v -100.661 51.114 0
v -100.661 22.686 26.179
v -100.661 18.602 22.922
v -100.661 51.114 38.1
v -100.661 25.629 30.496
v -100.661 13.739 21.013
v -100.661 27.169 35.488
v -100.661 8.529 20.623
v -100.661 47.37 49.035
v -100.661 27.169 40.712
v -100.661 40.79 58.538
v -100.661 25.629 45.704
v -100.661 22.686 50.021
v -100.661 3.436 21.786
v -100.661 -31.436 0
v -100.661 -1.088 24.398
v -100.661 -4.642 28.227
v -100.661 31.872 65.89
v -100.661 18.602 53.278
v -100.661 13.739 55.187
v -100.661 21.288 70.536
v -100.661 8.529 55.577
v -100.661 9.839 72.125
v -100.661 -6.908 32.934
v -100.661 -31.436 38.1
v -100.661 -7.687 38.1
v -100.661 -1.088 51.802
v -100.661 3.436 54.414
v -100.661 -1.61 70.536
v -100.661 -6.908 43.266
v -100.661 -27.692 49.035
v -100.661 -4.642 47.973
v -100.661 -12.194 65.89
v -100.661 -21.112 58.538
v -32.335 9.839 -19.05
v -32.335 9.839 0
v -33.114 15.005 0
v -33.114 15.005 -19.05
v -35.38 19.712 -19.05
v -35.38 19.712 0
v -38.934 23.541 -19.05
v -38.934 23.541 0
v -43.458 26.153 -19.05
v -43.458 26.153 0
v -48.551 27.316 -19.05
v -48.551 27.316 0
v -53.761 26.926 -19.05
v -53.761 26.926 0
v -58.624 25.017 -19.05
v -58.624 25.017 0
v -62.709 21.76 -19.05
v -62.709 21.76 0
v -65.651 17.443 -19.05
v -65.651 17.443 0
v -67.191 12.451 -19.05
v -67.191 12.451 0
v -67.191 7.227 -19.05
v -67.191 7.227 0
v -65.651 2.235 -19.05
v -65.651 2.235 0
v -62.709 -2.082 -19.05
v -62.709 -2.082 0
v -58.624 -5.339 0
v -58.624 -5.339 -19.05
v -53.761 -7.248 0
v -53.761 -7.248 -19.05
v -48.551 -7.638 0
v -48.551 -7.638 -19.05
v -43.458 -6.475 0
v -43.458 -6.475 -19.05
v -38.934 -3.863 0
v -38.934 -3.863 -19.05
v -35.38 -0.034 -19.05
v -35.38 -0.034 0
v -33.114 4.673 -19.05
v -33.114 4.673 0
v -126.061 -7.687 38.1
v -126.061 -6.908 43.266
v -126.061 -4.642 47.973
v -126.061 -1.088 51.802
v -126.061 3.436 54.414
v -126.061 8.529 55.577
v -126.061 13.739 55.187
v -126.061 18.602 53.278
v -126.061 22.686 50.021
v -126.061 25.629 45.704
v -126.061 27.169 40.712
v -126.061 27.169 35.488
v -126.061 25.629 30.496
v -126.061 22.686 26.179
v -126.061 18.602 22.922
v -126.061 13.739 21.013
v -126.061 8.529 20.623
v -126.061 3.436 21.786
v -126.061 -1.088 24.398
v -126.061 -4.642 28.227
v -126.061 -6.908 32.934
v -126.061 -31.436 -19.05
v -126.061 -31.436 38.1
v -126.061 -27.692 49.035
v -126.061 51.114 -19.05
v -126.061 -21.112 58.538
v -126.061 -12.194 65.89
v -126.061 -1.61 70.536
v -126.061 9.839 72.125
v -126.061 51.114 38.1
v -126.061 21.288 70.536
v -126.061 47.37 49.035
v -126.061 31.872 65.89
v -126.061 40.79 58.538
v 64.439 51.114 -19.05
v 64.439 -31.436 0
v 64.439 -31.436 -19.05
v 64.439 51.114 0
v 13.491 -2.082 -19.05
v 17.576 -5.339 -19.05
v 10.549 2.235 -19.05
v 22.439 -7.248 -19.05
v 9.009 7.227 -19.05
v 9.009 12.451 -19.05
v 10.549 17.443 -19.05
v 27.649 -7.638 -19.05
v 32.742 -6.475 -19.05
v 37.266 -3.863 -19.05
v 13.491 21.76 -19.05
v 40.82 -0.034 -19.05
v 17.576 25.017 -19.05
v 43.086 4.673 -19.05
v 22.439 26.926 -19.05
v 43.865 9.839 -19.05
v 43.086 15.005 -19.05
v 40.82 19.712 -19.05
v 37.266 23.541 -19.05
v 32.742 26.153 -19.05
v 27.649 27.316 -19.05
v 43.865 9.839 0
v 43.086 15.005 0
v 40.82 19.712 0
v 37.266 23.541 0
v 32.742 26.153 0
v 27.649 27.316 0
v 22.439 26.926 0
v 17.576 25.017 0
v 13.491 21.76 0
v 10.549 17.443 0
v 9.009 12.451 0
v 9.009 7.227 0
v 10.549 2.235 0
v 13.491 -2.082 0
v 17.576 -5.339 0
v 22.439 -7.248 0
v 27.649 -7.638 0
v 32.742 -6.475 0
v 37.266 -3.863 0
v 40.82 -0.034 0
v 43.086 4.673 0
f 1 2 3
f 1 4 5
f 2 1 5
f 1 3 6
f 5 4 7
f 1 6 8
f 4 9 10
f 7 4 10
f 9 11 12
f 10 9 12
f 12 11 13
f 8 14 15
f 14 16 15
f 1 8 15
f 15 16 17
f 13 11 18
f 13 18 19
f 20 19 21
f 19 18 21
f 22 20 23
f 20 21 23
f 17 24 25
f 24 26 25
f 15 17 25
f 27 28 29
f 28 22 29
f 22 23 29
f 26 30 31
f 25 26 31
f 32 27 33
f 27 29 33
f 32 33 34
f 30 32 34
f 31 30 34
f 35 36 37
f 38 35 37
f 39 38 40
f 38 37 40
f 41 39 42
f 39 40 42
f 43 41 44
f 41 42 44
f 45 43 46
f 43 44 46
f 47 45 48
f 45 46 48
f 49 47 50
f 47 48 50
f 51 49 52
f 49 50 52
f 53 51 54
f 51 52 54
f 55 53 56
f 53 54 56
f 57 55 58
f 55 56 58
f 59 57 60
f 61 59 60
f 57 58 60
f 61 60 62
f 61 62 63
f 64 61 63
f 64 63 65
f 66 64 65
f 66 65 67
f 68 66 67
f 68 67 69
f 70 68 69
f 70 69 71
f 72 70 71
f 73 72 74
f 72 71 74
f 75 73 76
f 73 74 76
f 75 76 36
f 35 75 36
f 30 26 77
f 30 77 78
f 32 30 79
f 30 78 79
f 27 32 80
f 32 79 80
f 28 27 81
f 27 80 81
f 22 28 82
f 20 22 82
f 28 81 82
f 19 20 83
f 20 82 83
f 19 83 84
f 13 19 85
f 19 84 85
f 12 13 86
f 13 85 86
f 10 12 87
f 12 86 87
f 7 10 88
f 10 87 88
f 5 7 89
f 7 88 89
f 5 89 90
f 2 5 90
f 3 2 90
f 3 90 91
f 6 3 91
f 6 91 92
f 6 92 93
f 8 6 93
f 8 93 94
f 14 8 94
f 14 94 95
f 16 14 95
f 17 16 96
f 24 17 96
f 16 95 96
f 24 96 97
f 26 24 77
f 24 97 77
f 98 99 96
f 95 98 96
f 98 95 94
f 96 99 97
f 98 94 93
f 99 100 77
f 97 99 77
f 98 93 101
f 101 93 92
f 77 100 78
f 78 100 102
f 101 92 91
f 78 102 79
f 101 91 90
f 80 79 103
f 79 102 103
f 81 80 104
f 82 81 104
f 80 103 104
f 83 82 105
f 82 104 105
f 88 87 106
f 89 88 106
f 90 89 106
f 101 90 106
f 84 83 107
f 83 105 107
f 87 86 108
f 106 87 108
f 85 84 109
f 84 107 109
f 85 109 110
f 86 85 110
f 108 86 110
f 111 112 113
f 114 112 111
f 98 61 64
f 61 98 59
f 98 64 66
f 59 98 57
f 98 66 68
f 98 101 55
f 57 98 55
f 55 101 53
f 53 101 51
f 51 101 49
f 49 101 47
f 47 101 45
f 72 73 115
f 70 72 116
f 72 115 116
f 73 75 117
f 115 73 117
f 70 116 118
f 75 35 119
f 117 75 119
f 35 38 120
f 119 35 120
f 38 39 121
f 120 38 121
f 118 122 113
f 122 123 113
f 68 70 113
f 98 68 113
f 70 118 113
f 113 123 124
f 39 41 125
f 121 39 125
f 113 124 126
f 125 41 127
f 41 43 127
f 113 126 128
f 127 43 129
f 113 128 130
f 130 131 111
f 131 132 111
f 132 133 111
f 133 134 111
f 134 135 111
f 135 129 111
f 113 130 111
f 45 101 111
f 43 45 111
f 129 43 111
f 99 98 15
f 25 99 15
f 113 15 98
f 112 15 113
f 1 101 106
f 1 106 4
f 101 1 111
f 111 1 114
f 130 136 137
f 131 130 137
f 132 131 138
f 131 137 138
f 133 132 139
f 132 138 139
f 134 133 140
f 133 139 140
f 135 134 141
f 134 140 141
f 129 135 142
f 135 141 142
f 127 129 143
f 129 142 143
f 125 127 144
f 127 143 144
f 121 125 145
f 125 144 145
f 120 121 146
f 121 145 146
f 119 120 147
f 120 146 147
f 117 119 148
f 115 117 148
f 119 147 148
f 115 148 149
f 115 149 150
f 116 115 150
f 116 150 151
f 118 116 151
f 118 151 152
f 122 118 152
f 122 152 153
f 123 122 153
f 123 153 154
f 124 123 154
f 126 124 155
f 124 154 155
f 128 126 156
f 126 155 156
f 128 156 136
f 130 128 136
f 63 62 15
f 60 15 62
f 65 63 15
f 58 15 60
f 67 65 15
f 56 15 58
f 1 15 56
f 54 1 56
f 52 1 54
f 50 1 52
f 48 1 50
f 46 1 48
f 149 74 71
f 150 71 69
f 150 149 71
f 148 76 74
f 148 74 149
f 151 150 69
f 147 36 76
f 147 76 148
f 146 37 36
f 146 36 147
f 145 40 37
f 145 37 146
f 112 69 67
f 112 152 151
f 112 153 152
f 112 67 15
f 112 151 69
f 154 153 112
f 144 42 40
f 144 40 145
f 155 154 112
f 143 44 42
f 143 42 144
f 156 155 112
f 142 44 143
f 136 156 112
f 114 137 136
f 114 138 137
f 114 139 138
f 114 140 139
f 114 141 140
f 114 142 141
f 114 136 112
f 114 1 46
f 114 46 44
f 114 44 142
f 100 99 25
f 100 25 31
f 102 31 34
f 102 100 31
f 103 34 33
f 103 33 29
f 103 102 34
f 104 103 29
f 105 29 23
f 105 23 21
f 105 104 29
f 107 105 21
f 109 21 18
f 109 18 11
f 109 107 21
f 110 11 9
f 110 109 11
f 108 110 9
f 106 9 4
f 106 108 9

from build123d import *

# Parameters (mm, degrees)
F0_W     = 190.5
F0_H     = 82.55
F0_R     = 17.526
F1_DEPTH = 19.05
F2_W     = 82.55
F2_H     = 57.15
F3_DEPTH = 25.4
F4_R     = 17.526
F5_DEPTH = 25.4


with BuildPart() as f1:
    # F0 (on Top) → F1 (new body)
    with BuildSketch(Plane.XY):
        with Locations((-30.811098, 9.839004)):
            Rectangle(F0_W, F0_H)
        with Locations((-49.861098, 9.839004)):
            Circle(F0_R, mode=Mode.SUBTRACT)
        with Locations((26.338902, 9.839004)):
            Circle(F0_R, mode=Mode.SUBTRACT)
    extrude(amount=-F1_DEPTH)

    # F2 (on face) → F3 (join)
    with BuildSketch(Plane(origin=(-126.061098, 0, 0), x_dir=(0, -1, 0), z_dir=(-1, 0, 0))):
        with Locations((-9.839004, 9.525)):
            Rectangle(F2_W, F2_H)
        with BuildLine():
            ThreePointArc((31.435996, 38.1), (-9.839004, 72.125149), (-51.114004, 38.1))
            Line((-51.114004, 38.1), (31.435996, 38.1))
        make_face()
    extrude(amount=-F3_DEPTH)

    # F4 (on face) → F5 (cut)
    with BuildSketch(Plane(origin=(-126.061098, 0, 0), x_dir=(0, -1, 0), z_dir=(-1, 0, 0))):
        with Locations((-9.839004, 38.1)):
            Circle(F4_R)
    extrude(amount=-F5_DEPTH, mode=Mode.SUBTRACT)


solid = f1.part
